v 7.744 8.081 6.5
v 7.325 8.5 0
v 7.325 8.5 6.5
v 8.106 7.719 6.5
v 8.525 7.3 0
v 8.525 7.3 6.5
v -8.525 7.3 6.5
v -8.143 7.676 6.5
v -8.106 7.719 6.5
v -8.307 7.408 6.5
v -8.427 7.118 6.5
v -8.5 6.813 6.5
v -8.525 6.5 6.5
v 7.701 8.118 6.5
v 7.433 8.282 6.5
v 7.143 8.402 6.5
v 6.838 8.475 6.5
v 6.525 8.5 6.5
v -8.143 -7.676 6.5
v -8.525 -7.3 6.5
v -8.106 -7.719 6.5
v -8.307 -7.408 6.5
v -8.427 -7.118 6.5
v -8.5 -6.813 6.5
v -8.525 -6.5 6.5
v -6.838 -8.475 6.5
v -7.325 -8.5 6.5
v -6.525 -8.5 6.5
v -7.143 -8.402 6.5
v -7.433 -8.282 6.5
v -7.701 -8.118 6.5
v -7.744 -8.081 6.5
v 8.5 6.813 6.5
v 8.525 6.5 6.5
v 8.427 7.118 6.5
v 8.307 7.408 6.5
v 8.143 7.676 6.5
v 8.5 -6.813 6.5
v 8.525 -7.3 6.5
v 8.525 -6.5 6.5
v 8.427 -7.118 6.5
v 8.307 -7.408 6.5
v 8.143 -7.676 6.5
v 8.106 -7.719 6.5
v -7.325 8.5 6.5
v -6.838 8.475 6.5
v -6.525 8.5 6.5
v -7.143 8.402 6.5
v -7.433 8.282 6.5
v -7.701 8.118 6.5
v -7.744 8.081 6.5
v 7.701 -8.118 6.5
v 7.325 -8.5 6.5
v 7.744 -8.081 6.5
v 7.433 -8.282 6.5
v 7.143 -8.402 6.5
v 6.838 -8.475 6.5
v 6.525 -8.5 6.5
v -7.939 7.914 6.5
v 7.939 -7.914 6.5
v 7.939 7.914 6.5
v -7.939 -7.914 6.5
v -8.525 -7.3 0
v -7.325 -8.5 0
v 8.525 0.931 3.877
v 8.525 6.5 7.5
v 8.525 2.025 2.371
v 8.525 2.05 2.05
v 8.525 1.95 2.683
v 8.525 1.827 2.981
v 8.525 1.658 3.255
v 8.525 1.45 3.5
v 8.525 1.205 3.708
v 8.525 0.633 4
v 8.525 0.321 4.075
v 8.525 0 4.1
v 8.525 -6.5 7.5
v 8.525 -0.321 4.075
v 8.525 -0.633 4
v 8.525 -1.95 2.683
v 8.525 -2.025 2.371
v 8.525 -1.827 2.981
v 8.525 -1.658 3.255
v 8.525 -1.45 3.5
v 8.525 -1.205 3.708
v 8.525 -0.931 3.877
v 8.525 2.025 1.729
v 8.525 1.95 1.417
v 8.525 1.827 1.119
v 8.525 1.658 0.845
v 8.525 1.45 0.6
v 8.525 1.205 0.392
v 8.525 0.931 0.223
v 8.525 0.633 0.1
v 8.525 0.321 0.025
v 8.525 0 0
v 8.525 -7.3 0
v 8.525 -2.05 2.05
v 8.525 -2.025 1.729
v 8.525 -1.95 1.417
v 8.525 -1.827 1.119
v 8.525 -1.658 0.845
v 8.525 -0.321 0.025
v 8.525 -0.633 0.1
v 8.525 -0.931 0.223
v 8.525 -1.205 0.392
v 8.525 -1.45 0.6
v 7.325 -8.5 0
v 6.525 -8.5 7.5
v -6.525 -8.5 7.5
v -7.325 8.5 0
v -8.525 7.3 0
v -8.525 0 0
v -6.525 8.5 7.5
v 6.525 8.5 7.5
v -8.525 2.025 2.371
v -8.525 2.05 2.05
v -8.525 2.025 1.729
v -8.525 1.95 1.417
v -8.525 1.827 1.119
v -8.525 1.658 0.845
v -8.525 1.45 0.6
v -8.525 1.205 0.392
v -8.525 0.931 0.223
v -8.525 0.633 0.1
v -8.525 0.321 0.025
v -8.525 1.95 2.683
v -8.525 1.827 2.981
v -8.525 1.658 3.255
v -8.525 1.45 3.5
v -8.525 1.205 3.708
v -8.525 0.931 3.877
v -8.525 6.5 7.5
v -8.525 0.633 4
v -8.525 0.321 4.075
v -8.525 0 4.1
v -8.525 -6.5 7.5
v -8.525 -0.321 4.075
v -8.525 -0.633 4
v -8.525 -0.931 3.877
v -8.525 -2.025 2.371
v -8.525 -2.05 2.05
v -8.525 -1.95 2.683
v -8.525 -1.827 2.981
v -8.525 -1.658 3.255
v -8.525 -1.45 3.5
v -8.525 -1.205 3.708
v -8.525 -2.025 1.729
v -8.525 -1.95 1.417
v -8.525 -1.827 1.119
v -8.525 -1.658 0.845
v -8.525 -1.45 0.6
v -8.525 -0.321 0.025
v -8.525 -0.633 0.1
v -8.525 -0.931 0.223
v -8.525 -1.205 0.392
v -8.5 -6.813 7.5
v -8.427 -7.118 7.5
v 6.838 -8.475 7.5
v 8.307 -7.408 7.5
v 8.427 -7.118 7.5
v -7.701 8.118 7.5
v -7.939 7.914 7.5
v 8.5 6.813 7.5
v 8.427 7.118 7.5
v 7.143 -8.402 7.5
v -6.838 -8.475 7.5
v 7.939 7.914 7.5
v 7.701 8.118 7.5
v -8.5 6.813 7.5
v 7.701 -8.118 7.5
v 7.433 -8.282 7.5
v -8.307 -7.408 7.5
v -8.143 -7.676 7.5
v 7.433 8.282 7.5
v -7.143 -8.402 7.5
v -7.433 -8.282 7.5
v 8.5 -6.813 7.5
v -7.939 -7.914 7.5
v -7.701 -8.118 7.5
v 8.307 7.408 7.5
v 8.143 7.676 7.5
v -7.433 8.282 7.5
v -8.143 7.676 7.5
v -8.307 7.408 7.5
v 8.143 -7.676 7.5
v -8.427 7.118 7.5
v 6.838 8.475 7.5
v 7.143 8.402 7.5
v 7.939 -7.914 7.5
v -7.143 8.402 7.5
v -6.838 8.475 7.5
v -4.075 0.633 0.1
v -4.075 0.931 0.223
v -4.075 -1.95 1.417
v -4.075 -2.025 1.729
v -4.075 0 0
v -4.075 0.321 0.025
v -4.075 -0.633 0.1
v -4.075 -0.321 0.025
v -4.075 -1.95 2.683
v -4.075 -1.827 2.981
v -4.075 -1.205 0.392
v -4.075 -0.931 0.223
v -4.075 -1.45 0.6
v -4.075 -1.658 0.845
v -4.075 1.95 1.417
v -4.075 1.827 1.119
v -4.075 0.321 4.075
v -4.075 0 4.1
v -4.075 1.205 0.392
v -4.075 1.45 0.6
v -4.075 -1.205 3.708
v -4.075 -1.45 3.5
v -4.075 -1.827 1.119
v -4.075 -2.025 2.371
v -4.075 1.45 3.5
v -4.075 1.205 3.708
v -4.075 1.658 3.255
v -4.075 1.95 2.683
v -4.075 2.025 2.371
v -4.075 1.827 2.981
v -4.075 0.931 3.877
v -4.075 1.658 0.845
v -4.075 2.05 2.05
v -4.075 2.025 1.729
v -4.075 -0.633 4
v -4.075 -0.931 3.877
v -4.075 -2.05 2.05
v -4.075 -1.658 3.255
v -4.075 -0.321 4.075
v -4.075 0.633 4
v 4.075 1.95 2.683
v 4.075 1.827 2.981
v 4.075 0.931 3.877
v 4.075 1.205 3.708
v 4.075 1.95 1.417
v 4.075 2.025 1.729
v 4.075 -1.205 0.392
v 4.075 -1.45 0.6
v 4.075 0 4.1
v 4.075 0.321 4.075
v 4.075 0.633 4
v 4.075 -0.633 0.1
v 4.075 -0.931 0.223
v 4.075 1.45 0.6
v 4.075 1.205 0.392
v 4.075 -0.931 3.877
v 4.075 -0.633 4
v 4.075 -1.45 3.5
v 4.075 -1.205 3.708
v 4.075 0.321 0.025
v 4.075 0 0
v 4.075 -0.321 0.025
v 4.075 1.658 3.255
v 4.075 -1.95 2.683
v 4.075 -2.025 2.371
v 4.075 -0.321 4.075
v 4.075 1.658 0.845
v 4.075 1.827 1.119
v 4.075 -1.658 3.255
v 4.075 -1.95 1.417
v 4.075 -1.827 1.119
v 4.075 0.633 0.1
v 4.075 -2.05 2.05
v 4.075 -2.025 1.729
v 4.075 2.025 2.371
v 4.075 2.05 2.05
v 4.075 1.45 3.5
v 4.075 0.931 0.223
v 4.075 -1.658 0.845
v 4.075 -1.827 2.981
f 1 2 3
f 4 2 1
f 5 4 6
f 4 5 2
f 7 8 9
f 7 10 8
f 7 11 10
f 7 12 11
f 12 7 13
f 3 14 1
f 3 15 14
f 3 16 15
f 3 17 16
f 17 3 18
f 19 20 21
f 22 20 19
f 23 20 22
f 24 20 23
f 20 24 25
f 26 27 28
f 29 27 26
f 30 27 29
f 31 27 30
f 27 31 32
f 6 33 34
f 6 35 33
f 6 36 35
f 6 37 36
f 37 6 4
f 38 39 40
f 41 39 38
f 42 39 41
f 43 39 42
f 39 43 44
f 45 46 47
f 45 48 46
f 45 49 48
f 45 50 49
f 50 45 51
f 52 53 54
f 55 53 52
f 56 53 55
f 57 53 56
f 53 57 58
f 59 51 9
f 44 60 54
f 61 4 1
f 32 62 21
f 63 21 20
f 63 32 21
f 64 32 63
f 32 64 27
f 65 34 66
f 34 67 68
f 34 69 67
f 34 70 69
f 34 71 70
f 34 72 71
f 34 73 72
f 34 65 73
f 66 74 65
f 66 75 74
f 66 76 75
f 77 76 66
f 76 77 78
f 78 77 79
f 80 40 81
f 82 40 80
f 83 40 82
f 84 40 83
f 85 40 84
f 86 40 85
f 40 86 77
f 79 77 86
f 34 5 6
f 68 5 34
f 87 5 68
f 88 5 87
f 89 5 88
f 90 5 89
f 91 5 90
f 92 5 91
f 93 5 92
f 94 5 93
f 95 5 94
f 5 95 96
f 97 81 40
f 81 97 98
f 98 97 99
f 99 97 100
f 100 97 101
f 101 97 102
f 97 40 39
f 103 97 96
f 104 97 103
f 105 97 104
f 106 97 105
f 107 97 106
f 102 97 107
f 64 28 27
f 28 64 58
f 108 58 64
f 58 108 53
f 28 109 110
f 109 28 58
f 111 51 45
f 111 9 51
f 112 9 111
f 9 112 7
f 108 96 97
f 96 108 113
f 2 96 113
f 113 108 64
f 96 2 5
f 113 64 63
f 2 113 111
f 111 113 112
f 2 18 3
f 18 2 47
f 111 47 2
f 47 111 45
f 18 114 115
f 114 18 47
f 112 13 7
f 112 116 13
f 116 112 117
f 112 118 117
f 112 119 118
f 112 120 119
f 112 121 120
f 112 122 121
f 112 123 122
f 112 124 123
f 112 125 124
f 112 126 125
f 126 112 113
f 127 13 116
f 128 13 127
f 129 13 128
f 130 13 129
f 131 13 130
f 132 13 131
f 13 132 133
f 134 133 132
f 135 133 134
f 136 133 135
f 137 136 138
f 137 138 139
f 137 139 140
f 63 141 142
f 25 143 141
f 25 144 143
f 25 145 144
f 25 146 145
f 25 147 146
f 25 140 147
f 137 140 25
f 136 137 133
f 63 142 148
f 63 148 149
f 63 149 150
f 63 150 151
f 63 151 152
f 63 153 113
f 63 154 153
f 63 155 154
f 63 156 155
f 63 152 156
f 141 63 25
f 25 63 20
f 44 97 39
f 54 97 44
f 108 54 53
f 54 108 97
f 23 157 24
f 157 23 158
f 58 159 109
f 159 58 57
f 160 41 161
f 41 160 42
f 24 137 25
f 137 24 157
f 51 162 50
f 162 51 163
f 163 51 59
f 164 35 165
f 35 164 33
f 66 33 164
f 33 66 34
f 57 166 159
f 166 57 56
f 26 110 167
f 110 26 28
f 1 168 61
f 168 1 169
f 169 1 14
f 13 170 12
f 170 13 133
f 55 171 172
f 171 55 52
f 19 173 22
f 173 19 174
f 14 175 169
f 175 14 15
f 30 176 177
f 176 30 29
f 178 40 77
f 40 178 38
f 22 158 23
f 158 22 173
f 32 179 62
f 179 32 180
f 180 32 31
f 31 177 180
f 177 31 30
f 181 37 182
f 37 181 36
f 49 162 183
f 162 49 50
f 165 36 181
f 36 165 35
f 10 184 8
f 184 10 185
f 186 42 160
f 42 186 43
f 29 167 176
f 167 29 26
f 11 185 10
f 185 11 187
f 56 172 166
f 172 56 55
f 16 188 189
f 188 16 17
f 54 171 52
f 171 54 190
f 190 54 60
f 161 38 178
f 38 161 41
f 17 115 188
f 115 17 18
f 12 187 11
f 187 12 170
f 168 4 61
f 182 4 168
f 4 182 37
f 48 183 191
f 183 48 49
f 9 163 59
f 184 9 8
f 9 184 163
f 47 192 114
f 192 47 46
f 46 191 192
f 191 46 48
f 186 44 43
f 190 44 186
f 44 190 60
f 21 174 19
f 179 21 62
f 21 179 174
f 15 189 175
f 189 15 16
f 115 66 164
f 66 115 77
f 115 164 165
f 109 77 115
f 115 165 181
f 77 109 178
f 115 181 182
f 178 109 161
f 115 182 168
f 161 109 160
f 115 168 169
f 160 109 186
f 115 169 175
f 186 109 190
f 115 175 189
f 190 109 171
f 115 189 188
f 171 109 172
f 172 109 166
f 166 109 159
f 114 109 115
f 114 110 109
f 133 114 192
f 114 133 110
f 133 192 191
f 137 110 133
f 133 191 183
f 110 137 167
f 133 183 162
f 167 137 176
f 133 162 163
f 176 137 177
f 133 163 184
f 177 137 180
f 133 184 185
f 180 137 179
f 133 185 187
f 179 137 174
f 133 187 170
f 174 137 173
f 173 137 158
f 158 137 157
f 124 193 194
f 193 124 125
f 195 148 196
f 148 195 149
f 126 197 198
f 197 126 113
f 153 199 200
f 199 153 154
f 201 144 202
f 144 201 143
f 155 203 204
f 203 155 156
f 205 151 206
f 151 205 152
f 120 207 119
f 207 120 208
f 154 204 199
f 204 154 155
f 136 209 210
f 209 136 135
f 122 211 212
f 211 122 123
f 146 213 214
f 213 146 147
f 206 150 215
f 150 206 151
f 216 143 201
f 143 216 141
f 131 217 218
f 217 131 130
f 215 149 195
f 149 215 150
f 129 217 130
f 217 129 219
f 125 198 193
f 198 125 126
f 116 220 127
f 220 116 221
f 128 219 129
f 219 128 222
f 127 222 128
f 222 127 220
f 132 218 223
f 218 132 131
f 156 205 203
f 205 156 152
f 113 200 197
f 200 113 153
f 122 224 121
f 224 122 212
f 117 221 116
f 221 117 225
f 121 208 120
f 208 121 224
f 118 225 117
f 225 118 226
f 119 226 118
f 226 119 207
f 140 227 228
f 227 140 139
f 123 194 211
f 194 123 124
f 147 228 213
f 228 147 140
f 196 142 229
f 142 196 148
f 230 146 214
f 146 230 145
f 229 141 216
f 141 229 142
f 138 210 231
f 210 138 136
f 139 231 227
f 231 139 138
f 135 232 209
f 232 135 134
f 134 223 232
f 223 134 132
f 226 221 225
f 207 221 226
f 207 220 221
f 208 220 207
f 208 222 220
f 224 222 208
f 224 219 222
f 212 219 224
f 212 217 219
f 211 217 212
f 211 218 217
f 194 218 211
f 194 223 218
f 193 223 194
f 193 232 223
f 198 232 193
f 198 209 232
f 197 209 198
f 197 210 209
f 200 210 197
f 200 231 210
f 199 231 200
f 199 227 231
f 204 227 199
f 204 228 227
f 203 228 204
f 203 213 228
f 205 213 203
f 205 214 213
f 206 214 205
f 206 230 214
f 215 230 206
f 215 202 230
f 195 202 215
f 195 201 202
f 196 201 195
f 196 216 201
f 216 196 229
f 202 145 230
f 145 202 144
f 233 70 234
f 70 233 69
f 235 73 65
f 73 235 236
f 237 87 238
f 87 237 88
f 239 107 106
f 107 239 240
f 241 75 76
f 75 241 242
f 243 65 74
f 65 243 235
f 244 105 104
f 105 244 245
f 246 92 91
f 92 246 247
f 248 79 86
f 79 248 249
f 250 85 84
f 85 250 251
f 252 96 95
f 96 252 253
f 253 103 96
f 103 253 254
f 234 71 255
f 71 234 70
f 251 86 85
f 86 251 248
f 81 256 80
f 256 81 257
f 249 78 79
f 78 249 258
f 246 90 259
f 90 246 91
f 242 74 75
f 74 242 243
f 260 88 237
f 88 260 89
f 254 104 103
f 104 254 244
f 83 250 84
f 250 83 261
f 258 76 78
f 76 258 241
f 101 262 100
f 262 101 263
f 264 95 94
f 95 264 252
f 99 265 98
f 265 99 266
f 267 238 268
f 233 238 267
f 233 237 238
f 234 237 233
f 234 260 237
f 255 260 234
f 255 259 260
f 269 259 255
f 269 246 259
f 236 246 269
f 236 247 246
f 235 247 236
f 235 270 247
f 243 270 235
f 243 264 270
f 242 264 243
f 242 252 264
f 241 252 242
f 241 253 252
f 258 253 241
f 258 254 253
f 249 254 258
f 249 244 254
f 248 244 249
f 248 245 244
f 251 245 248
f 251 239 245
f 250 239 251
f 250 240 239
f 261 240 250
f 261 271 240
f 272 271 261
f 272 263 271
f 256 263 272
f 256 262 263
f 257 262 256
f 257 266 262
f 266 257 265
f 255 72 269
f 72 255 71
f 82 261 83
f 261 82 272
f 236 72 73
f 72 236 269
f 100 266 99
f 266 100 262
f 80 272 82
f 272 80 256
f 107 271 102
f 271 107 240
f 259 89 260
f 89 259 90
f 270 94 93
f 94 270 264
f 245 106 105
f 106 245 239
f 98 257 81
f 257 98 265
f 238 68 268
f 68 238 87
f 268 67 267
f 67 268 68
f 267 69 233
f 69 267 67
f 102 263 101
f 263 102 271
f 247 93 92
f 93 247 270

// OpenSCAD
// file: thickplate-v4.scad
// ============================================================
// 厚板通孔方案 v4 · 2026-10-07 重生成（取代 thickplate-v3.scad，旧文件已删）
//   板 = 300.2×192×9（与 PCB 同高同宽，四角 R4）；67 孔【打穿】（2026-10-04 用户拍板）
//   孔心 = EDA 霍尔位 H01~H67 直接映射（用户 2026-10-07 拍板：v5.1"+4 预放偏置"弃用，霍尔位即键位）
//   磁道 73 条 = 键帽缝道 61（自前缘 y=0 即空格侧板缘开通至缝位，磁铁 4×2 竖放水平插入）
//               + 行端道 12（自左右板缘开通）；剖面 z 3~7，边缘开口盲槽【不穿透】→ 工艺 CNC
//   坐标系：scad = EDA 帧直接映射（x 相同；y_scad = 192 + EDA_y_mm = 距前缘距离，y-up）
//   订购图：07-PCB/output/厚板订购图-V6-打穿版-20261007.svg（与本文件同源同值）
// 磁路 v5.2（与 pcb-hall-positions.csv 键宽列同源）：
//   每键 2×N52 4×2 圆盘【竖立】嵌键帽左右侧壁——外侧壁水平打腔横插，N 面朝邻键缝隙
//     1u：±7.025；宽键：±(wu×9.525−2.0−wall_t)（外壁 0.5，极面间隙≈3.0mm）
// ★ P0′ 待裁决（不变）：① 竖立磁铁感应点位实测扫偏 ② 帽间对斥无托举→PCB 平贴对斥磁是否加
// ============================================================

// ---- 板 ----
plate_w = 300.2;
plate_d = 192.0;
plate_t = 9.0;         // 厚板厚
hole_sq = 17.6;        // 键孔边长（1u 块 17.05 + 0.6 公差；宽键孔随 wu 加宽）
hole_r  = 2.0;         // 孔角 R
// ---- 键帽块（P3 另做，悬浮于通孔内，加长 11）----
key_wu   = 1;                        // 键宽 u（-D key_wu=1.5/1.75/2/2.25/2.75/6.25）
cap_w    = key_wu*19.05 - 2.0;       // 块宽（1u=17.05，直壁防邻键干涉）
cap_d    = 17.0;                     // 块深
cap_h    = 7.5;                      // 块高
cap_top_r = 2.0;                     // 顶面圆角
// ---- 侧磁（v5.3 全竖立+贴缝版）----
mag_d   = 4.1;         // 4×2 磁铁腔（+0.1 公差）
mag_z   = 2.05;        // 竖立腔轴心高（腔 Ø4.1 竖跨块底 0~4.1）
wall_t  = 0.5;         // 极面外壁（★间距旋钮：极面间隙≈2.05+2×wall_t）
mag_off = key_wu*9.525 - 2.0 - wall_t;   // 磁心横偏（1u=7.025；宽键同步）
echo(str("键帽块 ", key_wu, "u：", cap_w, "×", cap_d, "×", cap_h, "，孔宽 ", cap_w+0.6,
         "，侧磁 ±", mag_off, "（外壁 ", cap_w/2 - mag_off - mag_d/2, "mm）"));
echo(str("极面间隙 = ", 19.05 - cap_w + 2*wall_t, "mm（目标 ≥2，越小斥力越强）"));

// ---- 67 孔坐标（EDA live 霍尔位 2026-10-07；x,y=孔心（=霍尔位），wu=键宽；生成器注入勿手改）----
frame_holes = [[16.523, 92.488, 1], [35.573, 92.488, 1], [54.623, 92.488, 1], [73.673, 92.488, 1], [92.723, 92.488, 1], [111.773, 92.488, 1], [130.823, 92.488, 1], [149.873, 92.488, 1], [168.923, 92.488, 1], [187.973, 92.488, 1], [207.023, 92.488, 1], [226.073, 92.488, 1], [245.123, 92.488, 1], [273.698, 92.488, 2], [21.285, 73.438, 1.5], [45.098, 73.438, 1], [64.148, 73.438, 1], [83.198, 73.438, 1], [102.248, 73.438, 1], [121.298, 73.438, 1], [140.348, 73.438, 1], [159.398, 73.438, 1], [178.448, 73.438, 1], [197.498, 73.438, 1], [216.548, 73.438, 1], [235.598, 73.438, 1], [254.648, 73.438, 1], [278.46, 73.438, 1.5], [23.668, 54.388, 1.75], [49.86, 54.388, 1], [68.91, 54.388, 1], [87.96, 54.388, 1], [107.01, 54.388, 1], [126.06, 54.388, 1], [145.11, 54.388, 1], [164.16, 54.388, 1], [183.21, 54.388, 1], [202.26, 54.388, 1], [221.31, 54.388, 1], [240.36, 54.388, 1], [271.318, 54.388, 2.25], [28.43, 35.338, 2.25], [59.385, 35.338, 1], [78.435, 35.338, 1], [97.485, 35.338, 1], [116.535, 35.338, 1], [135.585, 35.338, 1], [154.635, 35.338, 1], [173.685, 35.338, 1], [192.735, 35.338, 1], [211.785, 35.338, 1], [230.835, 35.338, 1], [266.555, 35.338, 2.75], [18.905, 16.288, 1.25], [42.718, 16.288, 1.25], [66.53, 16.288, 1.25], [137.968, 16.288, 6.25], [209.405, 16.288, 1.25], [233.218, 16.288, 1.25], [257.03, 16.288, 1.25], [280.843, 16.288, 1.25], [16.523, 111.538, 1], [35.573, 111.538, 1], [54.623, 111.538, 1], [73.673, 111.538, 1], [92.723, 111.538, 1], [111.773, 111.538, 1]];

// 行心 y（行端道用；生成器注入勿手改）
row_ys = [111.538, 92.488, 73.438, 54.388, 35.338, 16.288];

// 打穿键孔（方孔 R2，宽随 wu）
module through_hole(x, y, wu) {
  hw = wu*19.05 - 2.0 + 0.6;   // 孔宽 = 块宽 + 0.6 公差
  translate([x, y, -0.1])
    linear_extrude(plate_t + 0.2)
      hull() for (sx=[-1,1], sy=[-1,1])
        translate([sx*(hw/2-hole_r), sy*(hole_sq/2-hole_r)]) circle(r=hole_r, $fn=48);
}
module all_holes() for (p = frame_holes) through_hole(p[0], p[1], p[2]);

// 键帽块（顶圆角，左右侧壁水平竖立腔：磁铁完全嵌入帽内部，同排全部同向）——P3 键帽件用
module keycap_block() {
  difference() {
    union() {
      linear_extrude(cap_h - 1.0) offset(r=1.2) square([cap_w, cap_d], center=true);
      translate([0,0,cap_h-1.0]) linear_extrude(1.0)
        hull() for (sx=[-1,1], sy=[-1,1])
          translate([sx*(cap_w/2-cap_top_r), sy*(cap_d/2-cap_top_r)]) circle(r=cap_top_r, $fn=32);
    }
    for (s=[-1,1])
      translate([s*cap_w/2, 0, mag_z])
        rotate([0, -s*90, 0])
          cylinder(d=mag_d, h=cap_w/2 - mag_off + 1.1, $fn=40);
  }
}

// 缝道 ×61：自前缘 y=0（空格侧板缘）沿缝位开通至每条键帽缝，2.0 宽 × 4.0 高（z 3~7）
// 磁铁 4×2 竖放、从板前缘插入推至缝位（铁律：磁铁一律竖放）
module seam_channels() {
  for (i = [0 : len(frame_holes) - 2]) {
    a = frame_holes[i]; b = frame_holes[i + 1];
    if (a[1] == b[1]) {                      // 同一排才构成键帽缝
      hwa = a[2]*19.05 - 2 + 0.6; hwb = b[2]*19.05 - 2 + 0.6;
      sx = (a[0] + hwa/2 + b[0] - hwb/2) / 2;  // 缝中央 = 两孔相邻边中点
      translate([sx, a[1]/2, 5.0])
        cube([2.0, a[1] + 2, 4.0], center = true);   // y −1 → 缝心+1（缘外 1mm 为切削余量）
    }
  }
}

// 行端道 ×12：端键磁心对齐外推，左端自左缘、右端自右缘水平开通，4.0 × 4.0（z 3~7）
module end_channels() {
  for (y = row_ys) {
    row = [for (p = frame_holes) if (p[1] == y) p];
    a = row[0]; b = row[len(row) - 1];
    sxL = a[0] - a[2]*9.525;   // 左端槽心（磁心再外推 2.5，与 v3 同式）
    sxR = b[0] + b[2]*9.525;
    translate([(-1 + sxL + 1.0) / 2, y, 5.0])
      cube([sxL + 2.0, 4.0, 4.0], center = true);          // 左通道: x −1 → 槽心+1
    translate([(sxR - 1.0 + plate_w + 1) / 2, y, 5.0])
      cube([plate_w + 1 - sxR + 1.0, 4.0, 4.0], center = true);  // 右通道: 槽心−1 → 板右缘外
  }
}

// 厚板本体（300.2×192 四角 R4；挖 67 打穿孔 + 61 缝道 + 12 行端道）
module thick_plate() {
  difference() {
    translate([4, 4, 0]) linear_extrude(plate_t)
      offset(r=4) square([plate_w-8, plate_d-8]);
    all_holes();
    seam_channels();
    end_channels();
  }
}

// P3 试装板：1u×2 + 2u×1 单排（试产帽手感/摇晃量/回弹实测）
module test_plate() {
  difference() {
    translate([3, 3, 0]) linear_extrude(plate_t) offset(r=3) square([100, 40]);
    for (p = [[14, 20, 1], [33.05, 20, 1], [70, 20, 2]])
      through_hole(p[0], p[1], p[2]);
  }
}

thick_plate();   // 默认出厚板；试装板用 test_plate() 手动替换
// main file
// ============================================================
// KeyCore 键帽 · v5.3 侧壁竖磁键帽 · 参数化全型
//   来源: thickplate-v4.scad keycap_block() 参数化扩展 (2026-10-17)
//   磁路 v5.3: 2×N52 4×2 圆盘竖立, 嵌帽左右侧壁, 外侧壁水平开口横插
//   材质建议: 树脂打印(强度/手感) 或 PETG; 顶面贴键帽字符片
// 用法:
//   单件: keycap(wu=1)            // 1u
//         keycap(wu=2.75)         // 2.75u
//   全套预览: all_caps_67();      // 67 键按 thickplate-v4 frame_holes 排布
// 变体表 (封板 5c 实配 67 键): 1u×52, 1.25u×7, 1.5u×2, 1.75u×1,
//   2u×1, 2.25u×2, 2.75u×1, 6.25u×1 (空格)
// ============================================================

pitch    = 19.05;
cap_h    = 7.5;      // 块高
cap_d    = 17.0;     // 块深
clear    = 2.0;      // 帽间总间隙(单边 1.0)
top_r    = 2.0;      // 顶面圆角
band_r   = 1.2;      // 下段圆角
band_h   = 6.5;      // 下段高(上 1.0 为顶带)
mag_d    = 4.1;      // 磁腔直径(磁铁 4×2 +0.1)
mag_z    = 2.05;     // 磁腔轴心高(竖立: 腔跨 z 0~4.1)
wall_t   = 0.5;      // 极面外壁
mag_len  = 5.0;      // 磁铁长(横插, 含 1.1 过切)

module keycap(wu = 1) {
  cap_w = wu*pitch - clear;
  mag_off = wu*pitch/2 - 2.0 - wall_t;
  difference() {
    union() {
      linear_extrude(band_h)
        offset(r = band_r) offset(delta = -band_r)
          square([cap_w, cap_d], center = true);
      translate([0, 0, band_h]) linear_extrude(1.0)
        hull() for (sx = [-1,1], sy = [-1,1])
          translate([sx*(cap_w/2 - top_r), sy*(cap_d/2 - top_r)])
            circle(r = top_r, $fn = 40);
    }
    for (s = [-1, 1])
      translate([s*(cap_w/2 + 0.55), 0, mag_z])
        rotate([0, -s*90, 0])
          cylinder(d = mag_d, h = mag_len, $fn = 40);
  }
  // 磁铁占位提示(打印时注释掉): 两颗 4×2 N52 竖放, N 极同向朝邻缝
}

// 8 变体单件(打印排板示例, 间距 22mm)
module all_variants() {
  wus = [1, 1.25, 1.5, 1.75, 2, 2.25, 2.75, 6.25];
  for (i = [0 : len(wus) - 1])
    translate([i*22, 0, 0]) keycap(wus[i]);
}

// 67 键整板预览: 需与 thickplate-v4.scad 同目录 use <> 后调用, 或粘贴 frame_holes
module all_caps_67() {
  // frame_holes 与 thickplate-v4.scad 同源(67 孔 x,y,wu)
  echo("请 use <thickplate-v4.scad> 后调用, 或从 v4 复制 frame_holes 数组");
}

keycap(wu = 1);
